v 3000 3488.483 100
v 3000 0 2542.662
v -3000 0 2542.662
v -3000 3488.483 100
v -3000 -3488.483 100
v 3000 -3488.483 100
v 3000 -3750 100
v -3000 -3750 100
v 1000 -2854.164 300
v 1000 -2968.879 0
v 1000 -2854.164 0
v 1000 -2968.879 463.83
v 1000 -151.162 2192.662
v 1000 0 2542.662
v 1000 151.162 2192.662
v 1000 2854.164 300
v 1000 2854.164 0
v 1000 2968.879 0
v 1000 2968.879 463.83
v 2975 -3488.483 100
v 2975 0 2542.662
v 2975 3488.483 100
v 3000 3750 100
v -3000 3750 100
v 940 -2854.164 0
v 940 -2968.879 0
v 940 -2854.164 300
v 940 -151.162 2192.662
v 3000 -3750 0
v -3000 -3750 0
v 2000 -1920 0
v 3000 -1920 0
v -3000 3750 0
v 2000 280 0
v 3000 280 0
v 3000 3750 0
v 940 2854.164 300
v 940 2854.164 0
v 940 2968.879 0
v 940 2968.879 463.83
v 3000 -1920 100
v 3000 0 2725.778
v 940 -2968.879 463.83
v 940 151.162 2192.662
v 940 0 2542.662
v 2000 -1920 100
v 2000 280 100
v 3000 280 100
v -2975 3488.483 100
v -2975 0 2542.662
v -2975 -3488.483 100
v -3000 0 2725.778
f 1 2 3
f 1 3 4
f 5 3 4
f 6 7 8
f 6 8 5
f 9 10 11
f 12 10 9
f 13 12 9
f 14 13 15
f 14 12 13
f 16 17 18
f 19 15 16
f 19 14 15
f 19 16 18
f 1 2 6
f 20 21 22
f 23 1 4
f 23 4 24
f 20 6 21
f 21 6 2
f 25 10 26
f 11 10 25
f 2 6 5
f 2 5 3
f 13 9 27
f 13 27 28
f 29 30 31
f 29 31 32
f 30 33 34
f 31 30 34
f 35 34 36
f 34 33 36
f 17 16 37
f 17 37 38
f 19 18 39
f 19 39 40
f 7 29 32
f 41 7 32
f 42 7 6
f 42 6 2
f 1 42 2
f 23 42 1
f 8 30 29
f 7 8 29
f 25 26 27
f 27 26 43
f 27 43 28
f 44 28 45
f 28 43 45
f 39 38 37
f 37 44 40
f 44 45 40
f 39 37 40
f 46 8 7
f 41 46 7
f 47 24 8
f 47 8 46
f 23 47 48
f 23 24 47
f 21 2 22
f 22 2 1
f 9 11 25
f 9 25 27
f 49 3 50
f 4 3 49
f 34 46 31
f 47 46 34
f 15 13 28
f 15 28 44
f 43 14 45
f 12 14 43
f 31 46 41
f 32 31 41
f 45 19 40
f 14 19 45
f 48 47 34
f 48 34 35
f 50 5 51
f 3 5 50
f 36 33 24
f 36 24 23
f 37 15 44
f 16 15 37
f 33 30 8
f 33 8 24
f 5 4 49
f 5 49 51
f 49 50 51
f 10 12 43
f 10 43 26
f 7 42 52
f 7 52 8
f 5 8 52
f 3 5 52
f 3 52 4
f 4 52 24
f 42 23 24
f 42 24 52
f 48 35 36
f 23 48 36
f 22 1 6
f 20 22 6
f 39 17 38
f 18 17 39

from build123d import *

# Parameters (mm, degrees)
F0_W      = 6000
F0_H      = 7500
F1_DEPTH  = 100
F2_W      = 1000
F2_H      = 2200
F3_DEPTH  = 100.001
F5_DEPTH  = 6000
F7_DEPTH  = 25
F11_DEPTH = 60


with BuildPart() as f1:
    # F0 (on Top) → F1 (new body)
    with BuildSketch(Plane.XY):
        Rectangle(F0_W, F0_H)
    extrude(amount=F1_DEPTH)

    # F2 (on face) → F3 (cut, through all)
    with BuildSketch(Plane.XY.offset(100)):
        with Locations((2500, -820)):
            Rectangle(F2_W, F2_H)
    extrude(amount=-F3_DEPTH, mode=Mode.SUBTRACT)


with BuildPart() as f5:
    # F4 (on face) → F5 (new body)
    with BuildSketch(Plane.YZ.offset(3000)):
        Polygon((0, 2725.778268), (-3750, 100), (-3488.482981, 100), (0, 2542.66208), (3488.482981, 100), (3750, 100), align=None)
    extrude(amount=-F5_DEPTH)


with BuildPart() as f7:
    # F6 (on face) → F7 (new body)
    with BuildSketch(Plane(origin=(-3000, 0, 0), x_dir=(0, -1, 0), z_dir=(-1, 0, 0))):
        Polygon((0, 2542.66208), (-3488.482981, 100), (3488.482981, 100), align=None)
    extrude(amount=-F7_DEPTH)


with BuildPart() as f8_1:
    # F8: instance of F7
    add(f7.part.mirror(Plane.YZ))


with BuildPart() as f11:
    # F10 (on offset) → F11 (new body)
    with BuildSketch(Plane.YZ.offset(1000)):
        Polygon((-2854.16402, 300), (-151.162443, 2192.66208), (151.162443, 2192.66208), (2854.16402, 300), (2854.16402, 0), (2968.879307, 0), (2968.879307, 463.830409), (0, 2542.66208), (-2968.879307, 463.830409), (-2968.879307, 0), (-2854.16402, 0), align=None)
    extrude(amount=-F11_DEPTH)


solid = Compound([f1.part, f5.part, f7.part, f8_1.part, f11.part])
